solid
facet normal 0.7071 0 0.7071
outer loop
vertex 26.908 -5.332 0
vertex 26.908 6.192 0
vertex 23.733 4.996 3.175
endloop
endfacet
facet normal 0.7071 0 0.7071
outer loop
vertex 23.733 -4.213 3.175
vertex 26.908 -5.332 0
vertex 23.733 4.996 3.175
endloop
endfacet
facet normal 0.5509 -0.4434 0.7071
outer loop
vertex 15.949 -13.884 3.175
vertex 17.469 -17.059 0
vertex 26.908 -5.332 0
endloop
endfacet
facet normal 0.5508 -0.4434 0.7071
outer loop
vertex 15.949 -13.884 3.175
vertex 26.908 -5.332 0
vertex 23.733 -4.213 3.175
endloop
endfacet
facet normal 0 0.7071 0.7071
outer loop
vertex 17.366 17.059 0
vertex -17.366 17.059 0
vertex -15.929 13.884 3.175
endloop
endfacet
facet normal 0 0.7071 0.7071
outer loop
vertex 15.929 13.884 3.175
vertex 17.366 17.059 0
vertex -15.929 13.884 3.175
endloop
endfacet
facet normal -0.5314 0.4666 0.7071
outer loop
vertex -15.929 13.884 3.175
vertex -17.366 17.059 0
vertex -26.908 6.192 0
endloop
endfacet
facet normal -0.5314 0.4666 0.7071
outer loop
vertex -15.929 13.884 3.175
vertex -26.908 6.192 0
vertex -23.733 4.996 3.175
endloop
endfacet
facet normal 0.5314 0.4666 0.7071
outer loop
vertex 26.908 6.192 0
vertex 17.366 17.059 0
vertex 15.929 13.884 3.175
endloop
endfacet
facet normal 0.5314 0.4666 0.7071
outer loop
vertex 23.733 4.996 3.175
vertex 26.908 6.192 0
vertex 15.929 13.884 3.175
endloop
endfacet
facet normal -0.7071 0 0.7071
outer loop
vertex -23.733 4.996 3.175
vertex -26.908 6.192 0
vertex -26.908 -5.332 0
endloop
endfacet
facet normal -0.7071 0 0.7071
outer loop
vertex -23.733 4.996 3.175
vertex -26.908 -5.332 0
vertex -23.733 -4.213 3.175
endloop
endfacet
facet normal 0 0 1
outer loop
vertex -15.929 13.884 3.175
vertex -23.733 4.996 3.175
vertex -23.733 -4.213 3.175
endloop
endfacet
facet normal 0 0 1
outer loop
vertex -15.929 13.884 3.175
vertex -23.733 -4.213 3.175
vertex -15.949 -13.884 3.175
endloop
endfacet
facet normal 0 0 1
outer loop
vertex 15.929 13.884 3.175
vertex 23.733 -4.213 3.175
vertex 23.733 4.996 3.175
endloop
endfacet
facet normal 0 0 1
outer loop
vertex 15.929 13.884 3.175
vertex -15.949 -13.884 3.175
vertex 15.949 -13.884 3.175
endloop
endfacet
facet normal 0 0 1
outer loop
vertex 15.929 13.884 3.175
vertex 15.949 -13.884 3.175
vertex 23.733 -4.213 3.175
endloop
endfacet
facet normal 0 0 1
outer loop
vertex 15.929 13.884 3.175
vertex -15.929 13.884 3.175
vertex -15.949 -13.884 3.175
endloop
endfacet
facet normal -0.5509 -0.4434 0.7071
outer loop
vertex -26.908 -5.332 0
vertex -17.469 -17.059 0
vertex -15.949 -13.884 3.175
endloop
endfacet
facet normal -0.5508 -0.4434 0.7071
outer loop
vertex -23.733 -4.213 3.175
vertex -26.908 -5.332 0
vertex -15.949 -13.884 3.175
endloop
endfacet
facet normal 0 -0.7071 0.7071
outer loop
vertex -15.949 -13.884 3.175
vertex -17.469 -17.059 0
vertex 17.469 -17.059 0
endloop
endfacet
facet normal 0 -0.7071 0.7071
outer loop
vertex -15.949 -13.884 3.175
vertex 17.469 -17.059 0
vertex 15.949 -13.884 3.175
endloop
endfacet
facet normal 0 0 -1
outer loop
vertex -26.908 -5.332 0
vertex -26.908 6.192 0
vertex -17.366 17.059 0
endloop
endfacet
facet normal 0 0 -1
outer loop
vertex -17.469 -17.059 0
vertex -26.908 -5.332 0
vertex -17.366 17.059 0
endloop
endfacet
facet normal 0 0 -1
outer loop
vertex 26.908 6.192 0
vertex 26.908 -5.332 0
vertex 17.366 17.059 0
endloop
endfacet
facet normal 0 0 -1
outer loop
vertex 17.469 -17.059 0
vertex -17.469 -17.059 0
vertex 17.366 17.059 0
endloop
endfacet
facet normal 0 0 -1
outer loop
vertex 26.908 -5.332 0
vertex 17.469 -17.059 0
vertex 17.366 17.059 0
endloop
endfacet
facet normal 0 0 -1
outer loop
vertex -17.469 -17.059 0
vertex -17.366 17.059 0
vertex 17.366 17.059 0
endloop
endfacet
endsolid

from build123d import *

# Parameters (mm, degrees)
F1_DEPTH     = 3.175
F2_T1_DEPTH  = 39.0408928639
F2_T3_DEPTH  = 42.1701237591
F2_T5_DEPTH  = 62.58572165
F2_T7_DEPTH  = 42.1701213881
F2_T9_DEPTH  = 42.7652991577
F2_T11_DEPTH = 62.8914365267
F2_T13_DEPTH = 42.7652991577


# Not quite as in the source:
# - a fillet or chamfer that OpenCascade refuses, or shapes differently, is made with other operations: its cross-section is extruded or revolved along the edge and cut away or added


with BuildPart() as f1:
    # F0 (on Top) → F1 (new body)
    with BuildSketch(Plane.XY):
        Polygon((28.8131255029, 6.9092694693), (18.2287094494, 18.963740563), (-18.2287130429, 18.963740563), (-28.8131255029, 6.9092694693), (-28.8131255029, -6.0033242369), (-18.3815686845, -18.963740563), (18.3815686845, -18.963740563), (28.8131255029, -6.0033242369), align=None)
    extrude(amount=F1_DEPTH)

    # F2: chamfer of 5.08 on 8 edges, made by hand

    # F2_s2 → F2_t1 (cut)
    with BuildSketch(Plane.XZ.offset(-19.9734190482)):
        Polygon((28.8131255029, -1.905), (23.7331255029, 3.175), (28.8131255029, 3.175), align=None)
        Polygon((-28.8131255029, -1.905), (-23.7331255029, 3.175), (-28.8131255029, 3.175), align=None)
    extrude(amount=F2_T1_DEPTH, mode=Mode.SUBTRACT)

    # F2_s4 → F2_t3 (cut)
    with BuildSketch(Plane(origin=(17.7375583227, -20.2011034897, 0), x_dir=(0, 0, 1), z_dir=(-0.6598012581, 0.7514401506, 0))):
        Polygon((-1.905, 26.210084054), (3.175, 21.130084054), (3.175, 26.210084054), align=None)
    extrude(amount=F2_T3_DEPTH, mode=Mode.SUBTRACT)

    # F2_s6 → F2_t5 (cut)
    with BuildSketch(Plane.YZ.offset(-31.2928626217)):
        Polygon((18.963740563, -1.905), (13.883740563, 3.175), (18.963740563, 3.175), align=None)
    extrude(amount=F2_T5_DEPTH, mode=Mode.SUBTRACT)

    # F2_s8 → F2_t7 (cut)
    with BuildSketch(Plane(origin=(10.0863417988, 11.4872238883, 0), x_dir=(0, 0, 1), z_dir=(-0.6598011316, -0.7514402616, 0))):
        Polygon((-1.905, 26.2100863801), (3.175, 21.1300863801), (3.175, 26.2100863801), align=None)
    extrude(amount=F2_T7_DEPTH, mode=Mode.SUBTRACT)

    # F2_s10 → F2_t9 (cut)
    with BuildSketch(Plane(origin=(-16.5866539058, 20.6076565386, 0), x_dir=(0, 0, 1), z_dir=(0.627009486, -0.7790116202, 0))):
        Polygon((-1.905, 26.2099008264), (3.175, 21.1299008264), (3.175, 26.2099008264), align=None)
    extrude(amount=F2_T9_DEPTH, mode=Mode.SUBTRACT)

    # F2_s12 → F2_t11 (cut)
    with BuildSketch(Plane.YZ.offset(-31.4457182634)):
        Polygon((-18.963740563, -1.905), (-13.883740563, 3.175), (-18.963740563, 3.175), align=None)
    extrude(amount=F2_T11_DEPTH, mode=Mode.SUBTRACT)

    # F2_s14 → F2_t13 (cut)
    with BuildSketch(Plane(origin=(-10.2275943371, -12.7070084487, 0), x_dir=(0, 0, 1), z_dir=(0.627009486, 0.7790116202, 0))):
        Polygon((-1.905, 26.2099008264), (3.175, 21.1299008264), (3.175, 26.2099008264), align=None)
    extrude(amount=F2_T13_DEPTH, mode=Mode.SUBTRACT)


solid = f1.part
